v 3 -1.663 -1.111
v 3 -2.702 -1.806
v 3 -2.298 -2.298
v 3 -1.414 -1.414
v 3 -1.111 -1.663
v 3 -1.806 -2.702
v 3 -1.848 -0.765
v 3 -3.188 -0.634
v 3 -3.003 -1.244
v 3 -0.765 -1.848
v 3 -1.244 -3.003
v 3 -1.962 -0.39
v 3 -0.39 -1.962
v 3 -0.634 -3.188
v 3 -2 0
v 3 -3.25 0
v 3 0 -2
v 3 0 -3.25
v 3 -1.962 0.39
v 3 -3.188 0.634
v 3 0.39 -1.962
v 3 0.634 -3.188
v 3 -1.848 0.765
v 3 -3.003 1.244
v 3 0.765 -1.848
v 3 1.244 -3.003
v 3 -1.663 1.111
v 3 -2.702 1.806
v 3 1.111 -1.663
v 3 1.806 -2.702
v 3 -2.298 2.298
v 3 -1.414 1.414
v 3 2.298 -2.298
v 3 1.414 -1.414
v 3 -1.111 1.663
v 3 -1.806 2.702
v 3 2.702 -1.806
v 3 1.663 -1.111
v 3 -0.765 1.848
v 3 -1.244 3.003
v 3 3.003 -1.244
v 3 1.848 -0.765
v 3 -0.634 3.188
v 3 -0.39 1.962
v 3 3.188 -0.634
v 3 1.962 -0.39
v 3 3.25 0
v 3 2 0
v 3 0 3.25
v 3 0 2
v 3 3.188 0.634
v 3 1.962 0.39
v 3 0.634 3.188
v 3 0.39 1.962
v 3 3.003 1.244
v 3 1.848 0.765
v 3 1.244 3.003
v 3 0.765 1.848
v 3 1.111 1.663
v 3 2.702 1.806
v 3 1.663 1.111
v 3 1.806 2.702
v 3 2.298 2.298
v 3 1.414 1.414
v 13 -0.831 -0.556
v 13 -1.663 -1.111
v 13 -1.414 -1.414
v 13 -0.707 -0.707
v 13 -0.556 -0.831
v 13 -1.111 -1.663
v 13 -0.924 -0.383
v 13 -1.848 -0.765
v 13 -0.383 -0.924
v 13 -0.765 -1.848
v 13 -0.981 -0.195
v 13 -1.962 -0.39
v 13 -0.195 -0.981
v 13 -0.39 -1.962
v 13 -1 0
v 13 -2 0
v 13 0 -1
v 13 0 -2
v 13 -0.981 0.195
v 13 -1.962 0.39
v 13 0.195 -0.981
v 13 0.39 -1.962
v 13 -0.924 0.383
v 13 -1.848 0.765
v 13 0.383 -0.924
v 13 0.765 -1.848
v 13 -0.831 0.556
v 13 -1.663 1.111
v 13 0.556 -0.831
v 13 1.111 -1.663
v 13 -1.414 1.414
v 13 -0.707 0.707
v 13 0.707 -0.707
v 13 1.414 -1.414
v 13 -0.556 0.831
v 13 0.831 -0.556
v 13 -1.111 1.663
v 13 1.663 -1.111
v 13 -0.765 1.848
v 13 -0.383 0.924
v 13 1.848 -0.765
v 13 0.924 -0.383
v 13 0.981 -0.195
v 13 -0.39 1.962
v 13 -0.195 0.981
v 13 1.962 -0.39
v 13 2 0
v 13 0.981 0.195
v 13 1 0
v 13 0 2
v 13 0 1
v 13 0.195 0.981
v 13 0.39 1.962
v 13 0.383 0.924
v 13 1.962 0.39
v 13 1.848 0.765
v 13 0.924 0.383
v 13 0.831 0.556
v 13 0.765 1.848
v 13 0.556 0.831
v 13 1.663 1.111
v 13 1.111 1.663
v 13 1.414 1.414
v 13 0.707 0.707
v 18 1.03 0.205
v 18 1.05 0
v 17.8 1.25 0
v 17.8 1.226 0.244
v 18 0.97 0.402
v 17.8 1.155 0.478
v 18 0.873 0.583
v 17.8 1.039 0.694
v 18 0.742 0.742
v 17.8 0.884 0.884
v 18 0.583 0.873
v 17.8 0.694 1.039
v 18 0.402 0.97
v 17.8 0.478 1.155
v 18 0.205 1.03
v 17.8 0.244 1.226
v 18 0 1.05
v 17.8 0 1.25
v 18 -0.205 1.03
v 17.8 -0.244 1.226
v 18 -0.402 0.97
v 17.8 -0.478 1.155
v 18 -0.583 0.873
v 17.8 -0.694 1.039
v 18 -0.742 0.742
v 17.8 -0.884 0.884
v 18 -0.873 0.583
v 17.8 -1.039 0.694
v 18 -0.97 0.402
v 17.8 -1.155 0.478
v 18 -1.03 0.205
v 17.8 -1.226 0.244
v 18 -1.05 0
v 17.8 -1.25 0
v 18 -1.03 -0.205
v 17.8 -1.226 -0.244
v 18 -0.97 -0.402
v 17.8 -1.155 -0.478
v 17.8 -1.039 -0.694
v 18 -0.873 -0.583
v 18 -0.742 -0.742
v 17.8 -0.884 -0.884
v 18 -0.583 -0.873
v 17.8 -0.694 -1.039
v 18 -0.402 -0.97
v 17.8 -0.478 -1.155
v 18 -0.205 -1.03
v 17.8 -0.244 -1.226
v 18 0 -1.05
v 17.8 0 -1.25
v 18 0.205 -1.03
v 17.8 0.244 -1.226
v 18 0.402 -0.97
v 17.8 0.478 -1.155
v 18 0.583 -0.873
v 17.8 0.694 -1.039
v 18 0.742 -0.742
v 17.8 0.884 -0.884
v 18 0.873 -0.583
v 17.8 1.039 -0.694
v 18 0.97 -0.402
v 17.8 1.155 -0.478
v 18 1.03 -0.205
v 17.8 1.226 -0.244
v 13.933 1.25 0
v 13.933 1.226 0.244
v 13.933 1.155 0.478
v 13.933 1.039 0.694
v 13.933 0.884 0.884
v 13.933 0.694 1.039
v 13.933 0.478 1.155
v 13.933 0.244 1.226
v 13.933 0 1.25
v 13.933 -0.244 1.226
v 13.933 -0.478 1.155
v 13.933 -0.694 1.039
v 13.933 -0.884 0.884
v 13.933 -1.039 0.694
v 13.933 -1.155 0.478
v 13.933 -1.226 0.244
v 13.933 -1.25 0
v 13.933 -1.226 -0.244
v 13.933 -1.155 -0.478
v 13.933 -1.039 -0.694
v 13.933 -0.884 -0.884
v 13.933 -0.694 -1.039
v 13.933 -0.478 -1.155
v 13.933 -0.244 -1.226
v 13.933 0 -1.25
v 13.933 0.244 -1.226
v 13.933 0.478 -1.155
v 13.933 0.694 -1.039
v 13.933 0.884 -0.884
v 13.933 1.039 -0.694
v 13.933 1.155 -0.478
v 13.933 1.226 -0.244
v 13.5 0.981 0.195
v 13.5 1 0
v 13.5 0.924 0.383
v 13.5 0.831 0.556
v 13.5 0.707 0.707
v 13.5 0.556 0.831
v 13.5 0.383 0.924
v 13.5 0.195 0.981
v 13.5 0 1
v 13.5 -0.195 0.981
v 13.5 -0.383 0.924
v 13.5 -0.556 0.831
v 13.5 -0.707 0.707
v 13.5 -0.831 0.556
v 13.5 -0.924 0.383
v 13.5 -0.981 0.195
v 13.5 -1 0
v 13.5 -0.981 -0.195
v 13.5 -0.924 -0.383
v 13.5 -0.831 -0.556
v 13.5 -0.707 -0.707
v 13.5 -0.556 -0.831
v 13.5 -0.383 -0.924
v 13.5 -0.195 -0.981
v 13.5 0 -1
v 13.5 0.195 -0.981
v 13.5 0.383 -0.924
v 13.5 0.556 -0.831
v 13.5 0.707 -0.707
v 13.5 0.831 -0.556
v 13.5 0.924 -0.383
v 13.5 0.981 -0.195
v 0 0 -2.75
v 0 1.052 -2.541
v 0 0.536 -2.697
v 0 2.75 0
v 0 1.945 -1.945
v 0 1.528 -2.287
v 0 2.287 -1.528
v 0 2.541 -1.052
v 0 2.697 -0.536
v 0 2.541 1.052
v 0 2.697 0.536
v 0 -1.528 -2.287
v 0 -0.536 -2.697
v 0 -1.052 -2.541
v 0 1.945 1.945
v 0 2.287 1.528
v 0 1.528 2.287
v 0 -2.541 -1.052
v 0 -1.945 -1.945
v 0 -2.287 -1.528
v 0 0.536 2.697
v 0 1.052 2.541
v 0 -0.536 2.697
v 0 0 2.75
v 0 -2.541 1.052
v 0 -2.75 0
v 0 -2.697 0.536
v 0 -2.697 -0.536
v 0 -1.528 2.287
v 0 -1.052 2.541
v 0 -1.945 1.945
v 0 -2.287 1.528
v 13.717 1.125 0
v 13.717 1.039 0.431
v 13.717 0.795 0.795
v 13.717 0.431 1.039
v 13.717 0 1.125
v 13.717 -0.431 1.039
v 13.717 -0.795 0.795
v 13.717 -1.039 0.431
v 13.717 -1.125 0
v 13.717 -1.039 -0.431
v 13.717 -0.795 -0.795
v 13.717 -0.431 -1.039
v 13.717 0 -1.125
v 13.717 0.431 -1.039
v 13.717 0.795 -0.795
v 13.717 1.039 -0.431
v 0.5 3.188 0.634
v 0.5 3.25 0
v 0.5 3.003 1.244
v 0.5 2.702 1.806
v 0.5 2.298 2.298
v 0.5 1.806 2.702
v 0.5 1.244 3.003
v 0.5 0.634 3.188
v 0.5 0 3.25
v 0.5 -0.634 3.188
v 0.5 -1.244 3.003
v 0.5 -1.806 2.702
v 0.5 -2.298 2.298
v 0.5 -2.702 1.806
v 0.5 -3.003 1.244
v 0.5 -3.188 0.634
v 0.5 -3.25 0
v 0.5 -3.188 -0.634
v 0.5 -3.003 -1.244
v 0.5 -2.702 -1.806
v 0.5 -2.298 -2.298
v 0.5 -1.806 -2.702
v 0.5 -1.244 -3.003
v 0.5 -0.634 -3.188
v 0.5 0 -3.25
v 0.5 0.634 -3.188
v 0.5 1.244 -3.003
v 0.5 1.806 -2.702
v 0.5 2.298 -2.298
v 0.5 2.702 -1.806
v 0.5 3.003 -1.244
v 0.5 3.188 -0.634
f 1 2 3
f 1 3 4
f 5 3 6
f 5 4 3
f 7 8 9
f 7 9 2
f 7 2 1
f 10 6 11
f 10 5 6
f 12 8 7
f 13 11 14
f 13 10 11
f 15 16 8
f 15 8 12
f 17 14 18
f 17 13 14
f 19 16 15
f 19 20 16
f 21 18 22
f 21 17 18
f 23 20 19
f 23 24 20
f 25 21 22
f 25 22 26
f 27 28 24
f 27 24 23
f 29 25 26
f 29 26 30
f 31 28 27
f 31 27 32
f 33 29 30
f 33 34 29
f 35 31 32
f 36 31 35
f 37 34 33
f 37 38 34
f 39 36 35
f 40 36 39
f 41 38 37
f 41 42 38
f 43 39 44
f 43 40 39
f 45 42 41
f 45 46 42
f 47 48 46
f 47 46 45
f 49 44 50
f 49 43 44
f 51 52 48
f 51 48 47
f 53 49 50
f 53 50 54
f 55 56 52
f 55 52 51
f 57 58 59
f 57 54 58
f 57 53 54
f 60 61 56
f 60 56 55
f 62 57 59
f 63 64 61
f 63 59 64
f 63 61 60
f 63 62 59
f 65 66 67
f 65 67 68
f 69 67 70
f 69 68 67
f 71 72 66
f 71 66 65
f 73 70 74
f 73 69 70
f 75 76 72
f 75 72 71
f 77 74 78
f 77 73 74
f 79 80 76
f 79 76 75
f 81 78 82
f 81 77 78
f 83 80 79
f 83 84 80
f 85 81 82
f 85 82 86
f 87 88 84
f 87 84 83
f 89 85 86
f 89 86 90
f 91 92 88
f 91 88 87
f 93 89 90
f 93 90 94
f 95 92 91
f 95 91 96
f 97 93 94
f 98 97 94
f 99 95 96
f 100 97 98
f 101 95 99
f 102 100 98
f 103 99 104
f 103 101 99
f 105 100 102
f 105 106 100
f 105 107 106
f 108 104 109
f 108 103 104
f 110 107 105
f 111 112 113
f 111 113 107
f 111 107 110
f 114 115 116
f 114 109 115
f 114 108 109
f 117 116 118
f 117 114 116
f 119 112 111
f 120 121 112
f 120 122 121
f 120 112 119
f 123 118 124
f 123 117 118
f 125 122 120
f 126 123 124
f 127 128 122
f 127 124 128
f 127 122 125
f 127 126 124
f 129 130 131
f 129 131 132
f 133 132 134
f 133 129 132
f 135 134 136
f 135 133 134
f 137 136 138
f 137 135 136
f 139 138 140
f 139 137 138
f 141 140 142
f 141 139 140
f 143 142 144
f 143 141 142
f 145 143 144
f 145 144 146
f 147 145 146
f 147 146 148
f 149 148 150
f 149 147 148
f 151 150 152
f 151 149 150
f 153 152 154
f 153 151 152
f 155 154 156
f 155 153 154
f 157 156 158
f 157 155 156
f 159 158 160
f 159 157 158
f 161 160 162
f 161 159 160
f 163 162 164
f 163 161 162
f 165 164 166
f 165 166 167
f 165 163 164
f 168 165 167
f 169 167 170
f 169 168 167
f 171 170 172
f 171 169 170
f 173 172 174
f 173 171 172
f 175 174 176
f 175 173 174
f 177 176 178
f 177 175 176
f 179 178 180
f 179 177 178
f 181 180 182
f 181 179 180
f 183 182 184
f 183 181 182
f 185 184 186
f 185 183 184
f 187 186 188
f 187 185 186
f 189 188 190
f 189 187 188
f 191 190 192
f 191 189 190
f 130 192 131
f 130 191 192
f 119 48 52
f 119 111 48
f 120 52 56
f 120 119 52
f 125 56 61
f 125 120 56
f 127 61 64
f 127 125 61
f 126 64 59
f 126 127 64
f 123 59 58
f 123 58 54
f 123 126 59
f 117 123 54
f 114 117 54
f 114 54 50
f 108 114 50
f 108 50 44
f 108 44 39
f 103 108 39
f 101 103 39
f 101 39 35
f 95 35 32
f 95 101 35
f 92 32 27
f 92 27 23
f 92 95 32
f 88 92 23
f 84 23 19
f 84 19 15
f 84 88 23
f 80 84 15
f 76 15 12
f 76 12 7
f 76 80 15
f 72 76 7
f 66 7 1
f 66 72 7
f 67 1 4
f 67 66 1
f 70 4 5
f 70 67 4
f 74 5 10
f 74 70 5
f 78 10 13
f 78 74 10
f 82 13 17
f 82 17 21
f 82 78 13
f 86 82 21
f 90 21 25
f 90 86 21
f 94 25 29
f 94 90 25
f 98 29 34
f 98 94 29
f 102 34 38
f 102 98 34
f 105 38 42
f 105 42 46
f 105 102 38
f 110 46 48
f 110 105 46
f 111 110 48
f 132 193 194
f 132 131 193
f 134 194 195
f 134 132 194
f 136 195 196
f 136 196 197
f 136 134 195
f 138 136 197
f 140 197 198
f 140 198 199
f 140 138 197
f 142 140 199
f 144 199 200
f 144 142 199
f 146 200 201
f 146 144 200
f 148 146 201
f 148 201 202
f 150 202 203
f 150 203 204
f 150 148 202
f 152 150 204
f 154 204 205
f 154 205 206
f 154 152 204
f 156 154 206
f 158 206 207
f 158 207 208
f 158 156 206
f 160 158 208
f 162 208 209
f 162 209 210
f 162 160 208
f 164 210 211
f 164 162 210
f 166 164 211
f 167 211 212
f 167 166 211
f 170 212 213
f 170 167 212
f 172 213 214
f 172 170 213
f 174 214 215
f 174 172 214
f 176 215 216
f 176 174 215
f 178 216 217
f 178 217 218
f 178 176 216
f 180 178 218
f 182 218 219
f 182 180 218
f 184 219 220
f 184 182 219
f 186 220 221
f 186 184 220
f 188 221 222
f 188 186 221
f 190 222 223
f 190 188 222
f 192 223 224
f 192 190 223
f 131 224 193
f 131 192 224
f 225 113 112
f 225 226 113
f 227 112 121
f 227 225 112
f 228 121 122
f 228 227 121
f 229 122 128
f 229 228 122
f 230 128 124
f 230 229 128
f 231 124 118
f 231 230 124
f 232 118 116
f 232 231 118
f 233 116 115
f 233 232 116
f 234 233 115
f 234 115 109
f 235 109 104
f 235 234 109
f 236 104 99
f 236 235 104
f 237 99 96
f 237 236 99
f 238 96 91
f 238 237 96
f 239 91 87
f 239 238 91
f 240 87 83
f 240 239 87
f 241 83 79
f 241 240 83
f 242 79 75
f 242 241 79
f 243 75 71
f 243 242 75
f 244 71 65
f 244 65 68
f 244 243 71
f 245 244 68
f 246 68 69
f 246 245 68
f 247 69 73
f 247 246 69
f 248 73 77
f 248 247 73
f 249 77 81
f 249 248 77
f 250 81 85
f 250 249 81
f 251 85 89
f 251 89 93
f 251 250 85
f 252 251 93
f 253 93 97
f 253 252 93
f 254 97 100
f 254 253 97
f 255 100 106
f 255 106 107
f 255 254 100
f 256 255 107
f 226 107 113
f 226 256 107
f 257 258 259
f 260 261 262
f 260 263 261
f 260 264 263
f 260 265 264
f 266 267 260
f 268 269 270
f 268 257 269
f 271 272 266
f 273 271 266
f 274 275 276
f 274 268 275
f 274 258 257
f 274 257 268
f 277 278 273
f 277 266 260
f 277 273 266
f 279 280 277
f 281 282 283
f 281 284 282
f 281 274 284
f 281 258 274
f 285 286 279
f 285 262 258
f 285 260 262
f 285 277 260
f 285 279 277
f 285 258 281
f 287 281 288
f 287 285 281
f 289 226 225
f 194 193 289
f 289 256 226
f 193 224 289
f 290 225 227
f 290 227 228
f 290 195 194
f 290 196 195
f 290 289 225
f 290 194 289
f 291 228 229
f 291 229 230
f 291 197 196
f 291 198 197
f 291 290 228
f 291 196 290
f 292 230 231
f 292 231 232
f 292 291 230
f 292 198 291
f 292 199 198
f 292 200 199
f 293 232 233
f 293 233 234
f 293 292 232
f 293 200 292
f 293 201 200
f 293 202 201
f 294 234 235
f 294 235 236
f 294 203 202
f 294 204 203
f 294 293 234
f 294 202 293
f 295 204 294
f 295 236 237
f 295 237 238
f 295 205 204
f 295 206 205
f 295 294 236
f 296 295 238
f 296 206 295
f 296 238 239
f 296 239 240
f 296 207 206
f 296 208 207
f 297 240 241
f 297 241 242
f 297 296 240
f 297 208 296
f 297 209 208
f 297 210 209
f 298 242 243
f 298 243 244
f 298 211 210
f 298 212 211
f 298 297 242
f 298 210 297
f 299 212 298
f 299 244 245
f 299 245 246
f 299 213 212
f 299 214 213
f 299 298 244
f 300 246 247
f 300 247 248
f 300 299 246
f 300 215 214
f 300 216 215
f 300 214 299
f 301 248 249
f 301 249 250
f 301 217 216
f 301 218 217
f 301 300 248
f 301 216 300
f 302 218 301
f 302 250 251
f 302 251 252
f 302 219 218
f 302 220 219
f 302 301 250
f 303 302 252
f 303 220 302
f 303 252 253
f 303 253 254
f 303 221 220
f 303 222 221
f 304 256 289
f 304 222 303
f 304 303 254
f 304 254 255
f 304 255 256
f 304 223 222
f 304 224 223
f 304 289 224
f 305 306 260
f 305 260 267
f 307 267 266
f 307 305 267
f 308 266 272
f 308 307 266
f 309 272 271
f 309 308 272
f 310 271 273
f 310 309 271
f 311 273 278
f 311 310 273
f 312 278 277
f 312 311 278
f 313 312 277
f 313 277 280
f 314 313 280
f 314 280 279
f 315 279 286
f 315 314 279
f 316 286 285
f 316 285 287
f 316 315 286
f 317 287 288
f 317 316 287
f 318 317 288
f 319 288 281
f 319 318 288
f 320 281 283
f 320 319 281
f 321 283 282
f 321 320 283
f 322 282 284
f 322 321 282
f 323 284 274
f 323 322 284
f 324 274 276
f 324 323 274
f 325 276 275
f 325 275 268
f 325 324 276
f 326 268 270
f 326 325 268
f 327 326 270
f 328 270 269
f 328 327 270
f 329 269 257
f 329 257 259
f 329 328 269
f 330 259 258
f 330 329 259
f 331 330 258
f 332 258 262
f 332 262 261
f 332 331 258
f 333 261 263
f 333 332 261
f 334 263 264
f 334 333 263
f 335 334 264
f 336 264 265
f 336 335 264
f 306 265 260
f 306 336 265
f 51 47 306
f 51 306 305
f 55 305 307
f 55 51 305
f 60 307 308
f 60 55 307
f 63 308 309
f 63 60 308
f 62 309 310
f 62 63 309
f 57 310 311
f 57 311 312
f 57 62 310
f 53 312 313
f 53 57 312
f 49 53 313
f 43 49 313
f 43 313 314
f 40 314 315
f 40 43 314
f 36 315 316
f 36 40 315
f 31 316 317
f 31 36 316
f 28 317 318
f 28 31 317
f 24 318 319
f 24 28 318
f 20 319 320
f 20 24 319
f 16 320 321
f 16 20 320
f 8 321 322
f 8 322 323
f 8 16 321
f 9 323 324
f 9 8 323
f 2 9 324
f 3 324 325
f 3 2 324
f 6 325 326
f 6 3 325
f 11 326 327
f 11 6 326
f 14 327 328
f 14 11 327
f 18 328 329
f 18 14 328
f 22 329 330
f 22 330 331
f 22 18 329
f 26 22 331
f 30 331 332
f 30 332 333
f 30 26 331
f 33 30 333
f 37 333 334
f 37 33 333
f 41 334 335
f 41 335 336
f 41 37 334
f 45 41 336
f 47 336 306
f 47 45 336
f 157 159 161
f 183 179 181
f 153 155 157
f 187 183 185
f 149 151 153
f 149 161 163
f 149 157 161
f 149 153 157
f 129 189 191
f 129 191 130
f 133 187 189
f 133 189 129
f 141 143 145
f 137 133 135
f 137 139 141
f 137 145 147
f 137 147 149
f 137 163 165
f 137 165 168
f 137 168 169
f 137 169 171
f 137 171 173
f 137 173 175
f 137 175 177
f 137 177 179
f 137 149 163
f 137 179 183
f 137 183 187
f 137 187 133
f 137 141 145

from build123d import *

# Parameters (mm, degrees)
FASE1_SIZE = 0.5
FASE2_SIZE = 0.2


with BuildPart() as part:
    # Skizze1 → Rotation1 (revolve)
    with BuildSketch(Plane.XY):
        Polygon((0, 0), (0, 3.25), (3, 3.25), (3, 2), (13, 2), (13, 1.25), (18, 1.25), (18, 0), align=None)
    revolve(axis=Axis((0, 0, 0), (1, 0, 0)))

    # Fase1
    fase1_edges = [part.edges().sort_by_distance(p)[0] for p in [
        (0, -3.25, 0),
    ]]
    chamfer(fase1_edges, length=FASE1_SIZE)

    # Fase2
    fase2_edges = [part.edges().sort_by_distance(p)[0] for p in [
        (18, -1.25, 0),
    ]]
    chamfer(fase2_edges, length=FASE2_SIZE)

    # Skizze2 → Schnitt-Rotation1 (revolve, cut)
    with BuildSketch(Plane.XY):
        Polygon((13, 1.25), (13, 1), (13.5, 1), (13.933012702, 1.25), align=None)
    revolve(axis=Axis((0, 0, 0), (1, 0, 0)), mode=Mode.SUBTRACT)


solid = part.part
